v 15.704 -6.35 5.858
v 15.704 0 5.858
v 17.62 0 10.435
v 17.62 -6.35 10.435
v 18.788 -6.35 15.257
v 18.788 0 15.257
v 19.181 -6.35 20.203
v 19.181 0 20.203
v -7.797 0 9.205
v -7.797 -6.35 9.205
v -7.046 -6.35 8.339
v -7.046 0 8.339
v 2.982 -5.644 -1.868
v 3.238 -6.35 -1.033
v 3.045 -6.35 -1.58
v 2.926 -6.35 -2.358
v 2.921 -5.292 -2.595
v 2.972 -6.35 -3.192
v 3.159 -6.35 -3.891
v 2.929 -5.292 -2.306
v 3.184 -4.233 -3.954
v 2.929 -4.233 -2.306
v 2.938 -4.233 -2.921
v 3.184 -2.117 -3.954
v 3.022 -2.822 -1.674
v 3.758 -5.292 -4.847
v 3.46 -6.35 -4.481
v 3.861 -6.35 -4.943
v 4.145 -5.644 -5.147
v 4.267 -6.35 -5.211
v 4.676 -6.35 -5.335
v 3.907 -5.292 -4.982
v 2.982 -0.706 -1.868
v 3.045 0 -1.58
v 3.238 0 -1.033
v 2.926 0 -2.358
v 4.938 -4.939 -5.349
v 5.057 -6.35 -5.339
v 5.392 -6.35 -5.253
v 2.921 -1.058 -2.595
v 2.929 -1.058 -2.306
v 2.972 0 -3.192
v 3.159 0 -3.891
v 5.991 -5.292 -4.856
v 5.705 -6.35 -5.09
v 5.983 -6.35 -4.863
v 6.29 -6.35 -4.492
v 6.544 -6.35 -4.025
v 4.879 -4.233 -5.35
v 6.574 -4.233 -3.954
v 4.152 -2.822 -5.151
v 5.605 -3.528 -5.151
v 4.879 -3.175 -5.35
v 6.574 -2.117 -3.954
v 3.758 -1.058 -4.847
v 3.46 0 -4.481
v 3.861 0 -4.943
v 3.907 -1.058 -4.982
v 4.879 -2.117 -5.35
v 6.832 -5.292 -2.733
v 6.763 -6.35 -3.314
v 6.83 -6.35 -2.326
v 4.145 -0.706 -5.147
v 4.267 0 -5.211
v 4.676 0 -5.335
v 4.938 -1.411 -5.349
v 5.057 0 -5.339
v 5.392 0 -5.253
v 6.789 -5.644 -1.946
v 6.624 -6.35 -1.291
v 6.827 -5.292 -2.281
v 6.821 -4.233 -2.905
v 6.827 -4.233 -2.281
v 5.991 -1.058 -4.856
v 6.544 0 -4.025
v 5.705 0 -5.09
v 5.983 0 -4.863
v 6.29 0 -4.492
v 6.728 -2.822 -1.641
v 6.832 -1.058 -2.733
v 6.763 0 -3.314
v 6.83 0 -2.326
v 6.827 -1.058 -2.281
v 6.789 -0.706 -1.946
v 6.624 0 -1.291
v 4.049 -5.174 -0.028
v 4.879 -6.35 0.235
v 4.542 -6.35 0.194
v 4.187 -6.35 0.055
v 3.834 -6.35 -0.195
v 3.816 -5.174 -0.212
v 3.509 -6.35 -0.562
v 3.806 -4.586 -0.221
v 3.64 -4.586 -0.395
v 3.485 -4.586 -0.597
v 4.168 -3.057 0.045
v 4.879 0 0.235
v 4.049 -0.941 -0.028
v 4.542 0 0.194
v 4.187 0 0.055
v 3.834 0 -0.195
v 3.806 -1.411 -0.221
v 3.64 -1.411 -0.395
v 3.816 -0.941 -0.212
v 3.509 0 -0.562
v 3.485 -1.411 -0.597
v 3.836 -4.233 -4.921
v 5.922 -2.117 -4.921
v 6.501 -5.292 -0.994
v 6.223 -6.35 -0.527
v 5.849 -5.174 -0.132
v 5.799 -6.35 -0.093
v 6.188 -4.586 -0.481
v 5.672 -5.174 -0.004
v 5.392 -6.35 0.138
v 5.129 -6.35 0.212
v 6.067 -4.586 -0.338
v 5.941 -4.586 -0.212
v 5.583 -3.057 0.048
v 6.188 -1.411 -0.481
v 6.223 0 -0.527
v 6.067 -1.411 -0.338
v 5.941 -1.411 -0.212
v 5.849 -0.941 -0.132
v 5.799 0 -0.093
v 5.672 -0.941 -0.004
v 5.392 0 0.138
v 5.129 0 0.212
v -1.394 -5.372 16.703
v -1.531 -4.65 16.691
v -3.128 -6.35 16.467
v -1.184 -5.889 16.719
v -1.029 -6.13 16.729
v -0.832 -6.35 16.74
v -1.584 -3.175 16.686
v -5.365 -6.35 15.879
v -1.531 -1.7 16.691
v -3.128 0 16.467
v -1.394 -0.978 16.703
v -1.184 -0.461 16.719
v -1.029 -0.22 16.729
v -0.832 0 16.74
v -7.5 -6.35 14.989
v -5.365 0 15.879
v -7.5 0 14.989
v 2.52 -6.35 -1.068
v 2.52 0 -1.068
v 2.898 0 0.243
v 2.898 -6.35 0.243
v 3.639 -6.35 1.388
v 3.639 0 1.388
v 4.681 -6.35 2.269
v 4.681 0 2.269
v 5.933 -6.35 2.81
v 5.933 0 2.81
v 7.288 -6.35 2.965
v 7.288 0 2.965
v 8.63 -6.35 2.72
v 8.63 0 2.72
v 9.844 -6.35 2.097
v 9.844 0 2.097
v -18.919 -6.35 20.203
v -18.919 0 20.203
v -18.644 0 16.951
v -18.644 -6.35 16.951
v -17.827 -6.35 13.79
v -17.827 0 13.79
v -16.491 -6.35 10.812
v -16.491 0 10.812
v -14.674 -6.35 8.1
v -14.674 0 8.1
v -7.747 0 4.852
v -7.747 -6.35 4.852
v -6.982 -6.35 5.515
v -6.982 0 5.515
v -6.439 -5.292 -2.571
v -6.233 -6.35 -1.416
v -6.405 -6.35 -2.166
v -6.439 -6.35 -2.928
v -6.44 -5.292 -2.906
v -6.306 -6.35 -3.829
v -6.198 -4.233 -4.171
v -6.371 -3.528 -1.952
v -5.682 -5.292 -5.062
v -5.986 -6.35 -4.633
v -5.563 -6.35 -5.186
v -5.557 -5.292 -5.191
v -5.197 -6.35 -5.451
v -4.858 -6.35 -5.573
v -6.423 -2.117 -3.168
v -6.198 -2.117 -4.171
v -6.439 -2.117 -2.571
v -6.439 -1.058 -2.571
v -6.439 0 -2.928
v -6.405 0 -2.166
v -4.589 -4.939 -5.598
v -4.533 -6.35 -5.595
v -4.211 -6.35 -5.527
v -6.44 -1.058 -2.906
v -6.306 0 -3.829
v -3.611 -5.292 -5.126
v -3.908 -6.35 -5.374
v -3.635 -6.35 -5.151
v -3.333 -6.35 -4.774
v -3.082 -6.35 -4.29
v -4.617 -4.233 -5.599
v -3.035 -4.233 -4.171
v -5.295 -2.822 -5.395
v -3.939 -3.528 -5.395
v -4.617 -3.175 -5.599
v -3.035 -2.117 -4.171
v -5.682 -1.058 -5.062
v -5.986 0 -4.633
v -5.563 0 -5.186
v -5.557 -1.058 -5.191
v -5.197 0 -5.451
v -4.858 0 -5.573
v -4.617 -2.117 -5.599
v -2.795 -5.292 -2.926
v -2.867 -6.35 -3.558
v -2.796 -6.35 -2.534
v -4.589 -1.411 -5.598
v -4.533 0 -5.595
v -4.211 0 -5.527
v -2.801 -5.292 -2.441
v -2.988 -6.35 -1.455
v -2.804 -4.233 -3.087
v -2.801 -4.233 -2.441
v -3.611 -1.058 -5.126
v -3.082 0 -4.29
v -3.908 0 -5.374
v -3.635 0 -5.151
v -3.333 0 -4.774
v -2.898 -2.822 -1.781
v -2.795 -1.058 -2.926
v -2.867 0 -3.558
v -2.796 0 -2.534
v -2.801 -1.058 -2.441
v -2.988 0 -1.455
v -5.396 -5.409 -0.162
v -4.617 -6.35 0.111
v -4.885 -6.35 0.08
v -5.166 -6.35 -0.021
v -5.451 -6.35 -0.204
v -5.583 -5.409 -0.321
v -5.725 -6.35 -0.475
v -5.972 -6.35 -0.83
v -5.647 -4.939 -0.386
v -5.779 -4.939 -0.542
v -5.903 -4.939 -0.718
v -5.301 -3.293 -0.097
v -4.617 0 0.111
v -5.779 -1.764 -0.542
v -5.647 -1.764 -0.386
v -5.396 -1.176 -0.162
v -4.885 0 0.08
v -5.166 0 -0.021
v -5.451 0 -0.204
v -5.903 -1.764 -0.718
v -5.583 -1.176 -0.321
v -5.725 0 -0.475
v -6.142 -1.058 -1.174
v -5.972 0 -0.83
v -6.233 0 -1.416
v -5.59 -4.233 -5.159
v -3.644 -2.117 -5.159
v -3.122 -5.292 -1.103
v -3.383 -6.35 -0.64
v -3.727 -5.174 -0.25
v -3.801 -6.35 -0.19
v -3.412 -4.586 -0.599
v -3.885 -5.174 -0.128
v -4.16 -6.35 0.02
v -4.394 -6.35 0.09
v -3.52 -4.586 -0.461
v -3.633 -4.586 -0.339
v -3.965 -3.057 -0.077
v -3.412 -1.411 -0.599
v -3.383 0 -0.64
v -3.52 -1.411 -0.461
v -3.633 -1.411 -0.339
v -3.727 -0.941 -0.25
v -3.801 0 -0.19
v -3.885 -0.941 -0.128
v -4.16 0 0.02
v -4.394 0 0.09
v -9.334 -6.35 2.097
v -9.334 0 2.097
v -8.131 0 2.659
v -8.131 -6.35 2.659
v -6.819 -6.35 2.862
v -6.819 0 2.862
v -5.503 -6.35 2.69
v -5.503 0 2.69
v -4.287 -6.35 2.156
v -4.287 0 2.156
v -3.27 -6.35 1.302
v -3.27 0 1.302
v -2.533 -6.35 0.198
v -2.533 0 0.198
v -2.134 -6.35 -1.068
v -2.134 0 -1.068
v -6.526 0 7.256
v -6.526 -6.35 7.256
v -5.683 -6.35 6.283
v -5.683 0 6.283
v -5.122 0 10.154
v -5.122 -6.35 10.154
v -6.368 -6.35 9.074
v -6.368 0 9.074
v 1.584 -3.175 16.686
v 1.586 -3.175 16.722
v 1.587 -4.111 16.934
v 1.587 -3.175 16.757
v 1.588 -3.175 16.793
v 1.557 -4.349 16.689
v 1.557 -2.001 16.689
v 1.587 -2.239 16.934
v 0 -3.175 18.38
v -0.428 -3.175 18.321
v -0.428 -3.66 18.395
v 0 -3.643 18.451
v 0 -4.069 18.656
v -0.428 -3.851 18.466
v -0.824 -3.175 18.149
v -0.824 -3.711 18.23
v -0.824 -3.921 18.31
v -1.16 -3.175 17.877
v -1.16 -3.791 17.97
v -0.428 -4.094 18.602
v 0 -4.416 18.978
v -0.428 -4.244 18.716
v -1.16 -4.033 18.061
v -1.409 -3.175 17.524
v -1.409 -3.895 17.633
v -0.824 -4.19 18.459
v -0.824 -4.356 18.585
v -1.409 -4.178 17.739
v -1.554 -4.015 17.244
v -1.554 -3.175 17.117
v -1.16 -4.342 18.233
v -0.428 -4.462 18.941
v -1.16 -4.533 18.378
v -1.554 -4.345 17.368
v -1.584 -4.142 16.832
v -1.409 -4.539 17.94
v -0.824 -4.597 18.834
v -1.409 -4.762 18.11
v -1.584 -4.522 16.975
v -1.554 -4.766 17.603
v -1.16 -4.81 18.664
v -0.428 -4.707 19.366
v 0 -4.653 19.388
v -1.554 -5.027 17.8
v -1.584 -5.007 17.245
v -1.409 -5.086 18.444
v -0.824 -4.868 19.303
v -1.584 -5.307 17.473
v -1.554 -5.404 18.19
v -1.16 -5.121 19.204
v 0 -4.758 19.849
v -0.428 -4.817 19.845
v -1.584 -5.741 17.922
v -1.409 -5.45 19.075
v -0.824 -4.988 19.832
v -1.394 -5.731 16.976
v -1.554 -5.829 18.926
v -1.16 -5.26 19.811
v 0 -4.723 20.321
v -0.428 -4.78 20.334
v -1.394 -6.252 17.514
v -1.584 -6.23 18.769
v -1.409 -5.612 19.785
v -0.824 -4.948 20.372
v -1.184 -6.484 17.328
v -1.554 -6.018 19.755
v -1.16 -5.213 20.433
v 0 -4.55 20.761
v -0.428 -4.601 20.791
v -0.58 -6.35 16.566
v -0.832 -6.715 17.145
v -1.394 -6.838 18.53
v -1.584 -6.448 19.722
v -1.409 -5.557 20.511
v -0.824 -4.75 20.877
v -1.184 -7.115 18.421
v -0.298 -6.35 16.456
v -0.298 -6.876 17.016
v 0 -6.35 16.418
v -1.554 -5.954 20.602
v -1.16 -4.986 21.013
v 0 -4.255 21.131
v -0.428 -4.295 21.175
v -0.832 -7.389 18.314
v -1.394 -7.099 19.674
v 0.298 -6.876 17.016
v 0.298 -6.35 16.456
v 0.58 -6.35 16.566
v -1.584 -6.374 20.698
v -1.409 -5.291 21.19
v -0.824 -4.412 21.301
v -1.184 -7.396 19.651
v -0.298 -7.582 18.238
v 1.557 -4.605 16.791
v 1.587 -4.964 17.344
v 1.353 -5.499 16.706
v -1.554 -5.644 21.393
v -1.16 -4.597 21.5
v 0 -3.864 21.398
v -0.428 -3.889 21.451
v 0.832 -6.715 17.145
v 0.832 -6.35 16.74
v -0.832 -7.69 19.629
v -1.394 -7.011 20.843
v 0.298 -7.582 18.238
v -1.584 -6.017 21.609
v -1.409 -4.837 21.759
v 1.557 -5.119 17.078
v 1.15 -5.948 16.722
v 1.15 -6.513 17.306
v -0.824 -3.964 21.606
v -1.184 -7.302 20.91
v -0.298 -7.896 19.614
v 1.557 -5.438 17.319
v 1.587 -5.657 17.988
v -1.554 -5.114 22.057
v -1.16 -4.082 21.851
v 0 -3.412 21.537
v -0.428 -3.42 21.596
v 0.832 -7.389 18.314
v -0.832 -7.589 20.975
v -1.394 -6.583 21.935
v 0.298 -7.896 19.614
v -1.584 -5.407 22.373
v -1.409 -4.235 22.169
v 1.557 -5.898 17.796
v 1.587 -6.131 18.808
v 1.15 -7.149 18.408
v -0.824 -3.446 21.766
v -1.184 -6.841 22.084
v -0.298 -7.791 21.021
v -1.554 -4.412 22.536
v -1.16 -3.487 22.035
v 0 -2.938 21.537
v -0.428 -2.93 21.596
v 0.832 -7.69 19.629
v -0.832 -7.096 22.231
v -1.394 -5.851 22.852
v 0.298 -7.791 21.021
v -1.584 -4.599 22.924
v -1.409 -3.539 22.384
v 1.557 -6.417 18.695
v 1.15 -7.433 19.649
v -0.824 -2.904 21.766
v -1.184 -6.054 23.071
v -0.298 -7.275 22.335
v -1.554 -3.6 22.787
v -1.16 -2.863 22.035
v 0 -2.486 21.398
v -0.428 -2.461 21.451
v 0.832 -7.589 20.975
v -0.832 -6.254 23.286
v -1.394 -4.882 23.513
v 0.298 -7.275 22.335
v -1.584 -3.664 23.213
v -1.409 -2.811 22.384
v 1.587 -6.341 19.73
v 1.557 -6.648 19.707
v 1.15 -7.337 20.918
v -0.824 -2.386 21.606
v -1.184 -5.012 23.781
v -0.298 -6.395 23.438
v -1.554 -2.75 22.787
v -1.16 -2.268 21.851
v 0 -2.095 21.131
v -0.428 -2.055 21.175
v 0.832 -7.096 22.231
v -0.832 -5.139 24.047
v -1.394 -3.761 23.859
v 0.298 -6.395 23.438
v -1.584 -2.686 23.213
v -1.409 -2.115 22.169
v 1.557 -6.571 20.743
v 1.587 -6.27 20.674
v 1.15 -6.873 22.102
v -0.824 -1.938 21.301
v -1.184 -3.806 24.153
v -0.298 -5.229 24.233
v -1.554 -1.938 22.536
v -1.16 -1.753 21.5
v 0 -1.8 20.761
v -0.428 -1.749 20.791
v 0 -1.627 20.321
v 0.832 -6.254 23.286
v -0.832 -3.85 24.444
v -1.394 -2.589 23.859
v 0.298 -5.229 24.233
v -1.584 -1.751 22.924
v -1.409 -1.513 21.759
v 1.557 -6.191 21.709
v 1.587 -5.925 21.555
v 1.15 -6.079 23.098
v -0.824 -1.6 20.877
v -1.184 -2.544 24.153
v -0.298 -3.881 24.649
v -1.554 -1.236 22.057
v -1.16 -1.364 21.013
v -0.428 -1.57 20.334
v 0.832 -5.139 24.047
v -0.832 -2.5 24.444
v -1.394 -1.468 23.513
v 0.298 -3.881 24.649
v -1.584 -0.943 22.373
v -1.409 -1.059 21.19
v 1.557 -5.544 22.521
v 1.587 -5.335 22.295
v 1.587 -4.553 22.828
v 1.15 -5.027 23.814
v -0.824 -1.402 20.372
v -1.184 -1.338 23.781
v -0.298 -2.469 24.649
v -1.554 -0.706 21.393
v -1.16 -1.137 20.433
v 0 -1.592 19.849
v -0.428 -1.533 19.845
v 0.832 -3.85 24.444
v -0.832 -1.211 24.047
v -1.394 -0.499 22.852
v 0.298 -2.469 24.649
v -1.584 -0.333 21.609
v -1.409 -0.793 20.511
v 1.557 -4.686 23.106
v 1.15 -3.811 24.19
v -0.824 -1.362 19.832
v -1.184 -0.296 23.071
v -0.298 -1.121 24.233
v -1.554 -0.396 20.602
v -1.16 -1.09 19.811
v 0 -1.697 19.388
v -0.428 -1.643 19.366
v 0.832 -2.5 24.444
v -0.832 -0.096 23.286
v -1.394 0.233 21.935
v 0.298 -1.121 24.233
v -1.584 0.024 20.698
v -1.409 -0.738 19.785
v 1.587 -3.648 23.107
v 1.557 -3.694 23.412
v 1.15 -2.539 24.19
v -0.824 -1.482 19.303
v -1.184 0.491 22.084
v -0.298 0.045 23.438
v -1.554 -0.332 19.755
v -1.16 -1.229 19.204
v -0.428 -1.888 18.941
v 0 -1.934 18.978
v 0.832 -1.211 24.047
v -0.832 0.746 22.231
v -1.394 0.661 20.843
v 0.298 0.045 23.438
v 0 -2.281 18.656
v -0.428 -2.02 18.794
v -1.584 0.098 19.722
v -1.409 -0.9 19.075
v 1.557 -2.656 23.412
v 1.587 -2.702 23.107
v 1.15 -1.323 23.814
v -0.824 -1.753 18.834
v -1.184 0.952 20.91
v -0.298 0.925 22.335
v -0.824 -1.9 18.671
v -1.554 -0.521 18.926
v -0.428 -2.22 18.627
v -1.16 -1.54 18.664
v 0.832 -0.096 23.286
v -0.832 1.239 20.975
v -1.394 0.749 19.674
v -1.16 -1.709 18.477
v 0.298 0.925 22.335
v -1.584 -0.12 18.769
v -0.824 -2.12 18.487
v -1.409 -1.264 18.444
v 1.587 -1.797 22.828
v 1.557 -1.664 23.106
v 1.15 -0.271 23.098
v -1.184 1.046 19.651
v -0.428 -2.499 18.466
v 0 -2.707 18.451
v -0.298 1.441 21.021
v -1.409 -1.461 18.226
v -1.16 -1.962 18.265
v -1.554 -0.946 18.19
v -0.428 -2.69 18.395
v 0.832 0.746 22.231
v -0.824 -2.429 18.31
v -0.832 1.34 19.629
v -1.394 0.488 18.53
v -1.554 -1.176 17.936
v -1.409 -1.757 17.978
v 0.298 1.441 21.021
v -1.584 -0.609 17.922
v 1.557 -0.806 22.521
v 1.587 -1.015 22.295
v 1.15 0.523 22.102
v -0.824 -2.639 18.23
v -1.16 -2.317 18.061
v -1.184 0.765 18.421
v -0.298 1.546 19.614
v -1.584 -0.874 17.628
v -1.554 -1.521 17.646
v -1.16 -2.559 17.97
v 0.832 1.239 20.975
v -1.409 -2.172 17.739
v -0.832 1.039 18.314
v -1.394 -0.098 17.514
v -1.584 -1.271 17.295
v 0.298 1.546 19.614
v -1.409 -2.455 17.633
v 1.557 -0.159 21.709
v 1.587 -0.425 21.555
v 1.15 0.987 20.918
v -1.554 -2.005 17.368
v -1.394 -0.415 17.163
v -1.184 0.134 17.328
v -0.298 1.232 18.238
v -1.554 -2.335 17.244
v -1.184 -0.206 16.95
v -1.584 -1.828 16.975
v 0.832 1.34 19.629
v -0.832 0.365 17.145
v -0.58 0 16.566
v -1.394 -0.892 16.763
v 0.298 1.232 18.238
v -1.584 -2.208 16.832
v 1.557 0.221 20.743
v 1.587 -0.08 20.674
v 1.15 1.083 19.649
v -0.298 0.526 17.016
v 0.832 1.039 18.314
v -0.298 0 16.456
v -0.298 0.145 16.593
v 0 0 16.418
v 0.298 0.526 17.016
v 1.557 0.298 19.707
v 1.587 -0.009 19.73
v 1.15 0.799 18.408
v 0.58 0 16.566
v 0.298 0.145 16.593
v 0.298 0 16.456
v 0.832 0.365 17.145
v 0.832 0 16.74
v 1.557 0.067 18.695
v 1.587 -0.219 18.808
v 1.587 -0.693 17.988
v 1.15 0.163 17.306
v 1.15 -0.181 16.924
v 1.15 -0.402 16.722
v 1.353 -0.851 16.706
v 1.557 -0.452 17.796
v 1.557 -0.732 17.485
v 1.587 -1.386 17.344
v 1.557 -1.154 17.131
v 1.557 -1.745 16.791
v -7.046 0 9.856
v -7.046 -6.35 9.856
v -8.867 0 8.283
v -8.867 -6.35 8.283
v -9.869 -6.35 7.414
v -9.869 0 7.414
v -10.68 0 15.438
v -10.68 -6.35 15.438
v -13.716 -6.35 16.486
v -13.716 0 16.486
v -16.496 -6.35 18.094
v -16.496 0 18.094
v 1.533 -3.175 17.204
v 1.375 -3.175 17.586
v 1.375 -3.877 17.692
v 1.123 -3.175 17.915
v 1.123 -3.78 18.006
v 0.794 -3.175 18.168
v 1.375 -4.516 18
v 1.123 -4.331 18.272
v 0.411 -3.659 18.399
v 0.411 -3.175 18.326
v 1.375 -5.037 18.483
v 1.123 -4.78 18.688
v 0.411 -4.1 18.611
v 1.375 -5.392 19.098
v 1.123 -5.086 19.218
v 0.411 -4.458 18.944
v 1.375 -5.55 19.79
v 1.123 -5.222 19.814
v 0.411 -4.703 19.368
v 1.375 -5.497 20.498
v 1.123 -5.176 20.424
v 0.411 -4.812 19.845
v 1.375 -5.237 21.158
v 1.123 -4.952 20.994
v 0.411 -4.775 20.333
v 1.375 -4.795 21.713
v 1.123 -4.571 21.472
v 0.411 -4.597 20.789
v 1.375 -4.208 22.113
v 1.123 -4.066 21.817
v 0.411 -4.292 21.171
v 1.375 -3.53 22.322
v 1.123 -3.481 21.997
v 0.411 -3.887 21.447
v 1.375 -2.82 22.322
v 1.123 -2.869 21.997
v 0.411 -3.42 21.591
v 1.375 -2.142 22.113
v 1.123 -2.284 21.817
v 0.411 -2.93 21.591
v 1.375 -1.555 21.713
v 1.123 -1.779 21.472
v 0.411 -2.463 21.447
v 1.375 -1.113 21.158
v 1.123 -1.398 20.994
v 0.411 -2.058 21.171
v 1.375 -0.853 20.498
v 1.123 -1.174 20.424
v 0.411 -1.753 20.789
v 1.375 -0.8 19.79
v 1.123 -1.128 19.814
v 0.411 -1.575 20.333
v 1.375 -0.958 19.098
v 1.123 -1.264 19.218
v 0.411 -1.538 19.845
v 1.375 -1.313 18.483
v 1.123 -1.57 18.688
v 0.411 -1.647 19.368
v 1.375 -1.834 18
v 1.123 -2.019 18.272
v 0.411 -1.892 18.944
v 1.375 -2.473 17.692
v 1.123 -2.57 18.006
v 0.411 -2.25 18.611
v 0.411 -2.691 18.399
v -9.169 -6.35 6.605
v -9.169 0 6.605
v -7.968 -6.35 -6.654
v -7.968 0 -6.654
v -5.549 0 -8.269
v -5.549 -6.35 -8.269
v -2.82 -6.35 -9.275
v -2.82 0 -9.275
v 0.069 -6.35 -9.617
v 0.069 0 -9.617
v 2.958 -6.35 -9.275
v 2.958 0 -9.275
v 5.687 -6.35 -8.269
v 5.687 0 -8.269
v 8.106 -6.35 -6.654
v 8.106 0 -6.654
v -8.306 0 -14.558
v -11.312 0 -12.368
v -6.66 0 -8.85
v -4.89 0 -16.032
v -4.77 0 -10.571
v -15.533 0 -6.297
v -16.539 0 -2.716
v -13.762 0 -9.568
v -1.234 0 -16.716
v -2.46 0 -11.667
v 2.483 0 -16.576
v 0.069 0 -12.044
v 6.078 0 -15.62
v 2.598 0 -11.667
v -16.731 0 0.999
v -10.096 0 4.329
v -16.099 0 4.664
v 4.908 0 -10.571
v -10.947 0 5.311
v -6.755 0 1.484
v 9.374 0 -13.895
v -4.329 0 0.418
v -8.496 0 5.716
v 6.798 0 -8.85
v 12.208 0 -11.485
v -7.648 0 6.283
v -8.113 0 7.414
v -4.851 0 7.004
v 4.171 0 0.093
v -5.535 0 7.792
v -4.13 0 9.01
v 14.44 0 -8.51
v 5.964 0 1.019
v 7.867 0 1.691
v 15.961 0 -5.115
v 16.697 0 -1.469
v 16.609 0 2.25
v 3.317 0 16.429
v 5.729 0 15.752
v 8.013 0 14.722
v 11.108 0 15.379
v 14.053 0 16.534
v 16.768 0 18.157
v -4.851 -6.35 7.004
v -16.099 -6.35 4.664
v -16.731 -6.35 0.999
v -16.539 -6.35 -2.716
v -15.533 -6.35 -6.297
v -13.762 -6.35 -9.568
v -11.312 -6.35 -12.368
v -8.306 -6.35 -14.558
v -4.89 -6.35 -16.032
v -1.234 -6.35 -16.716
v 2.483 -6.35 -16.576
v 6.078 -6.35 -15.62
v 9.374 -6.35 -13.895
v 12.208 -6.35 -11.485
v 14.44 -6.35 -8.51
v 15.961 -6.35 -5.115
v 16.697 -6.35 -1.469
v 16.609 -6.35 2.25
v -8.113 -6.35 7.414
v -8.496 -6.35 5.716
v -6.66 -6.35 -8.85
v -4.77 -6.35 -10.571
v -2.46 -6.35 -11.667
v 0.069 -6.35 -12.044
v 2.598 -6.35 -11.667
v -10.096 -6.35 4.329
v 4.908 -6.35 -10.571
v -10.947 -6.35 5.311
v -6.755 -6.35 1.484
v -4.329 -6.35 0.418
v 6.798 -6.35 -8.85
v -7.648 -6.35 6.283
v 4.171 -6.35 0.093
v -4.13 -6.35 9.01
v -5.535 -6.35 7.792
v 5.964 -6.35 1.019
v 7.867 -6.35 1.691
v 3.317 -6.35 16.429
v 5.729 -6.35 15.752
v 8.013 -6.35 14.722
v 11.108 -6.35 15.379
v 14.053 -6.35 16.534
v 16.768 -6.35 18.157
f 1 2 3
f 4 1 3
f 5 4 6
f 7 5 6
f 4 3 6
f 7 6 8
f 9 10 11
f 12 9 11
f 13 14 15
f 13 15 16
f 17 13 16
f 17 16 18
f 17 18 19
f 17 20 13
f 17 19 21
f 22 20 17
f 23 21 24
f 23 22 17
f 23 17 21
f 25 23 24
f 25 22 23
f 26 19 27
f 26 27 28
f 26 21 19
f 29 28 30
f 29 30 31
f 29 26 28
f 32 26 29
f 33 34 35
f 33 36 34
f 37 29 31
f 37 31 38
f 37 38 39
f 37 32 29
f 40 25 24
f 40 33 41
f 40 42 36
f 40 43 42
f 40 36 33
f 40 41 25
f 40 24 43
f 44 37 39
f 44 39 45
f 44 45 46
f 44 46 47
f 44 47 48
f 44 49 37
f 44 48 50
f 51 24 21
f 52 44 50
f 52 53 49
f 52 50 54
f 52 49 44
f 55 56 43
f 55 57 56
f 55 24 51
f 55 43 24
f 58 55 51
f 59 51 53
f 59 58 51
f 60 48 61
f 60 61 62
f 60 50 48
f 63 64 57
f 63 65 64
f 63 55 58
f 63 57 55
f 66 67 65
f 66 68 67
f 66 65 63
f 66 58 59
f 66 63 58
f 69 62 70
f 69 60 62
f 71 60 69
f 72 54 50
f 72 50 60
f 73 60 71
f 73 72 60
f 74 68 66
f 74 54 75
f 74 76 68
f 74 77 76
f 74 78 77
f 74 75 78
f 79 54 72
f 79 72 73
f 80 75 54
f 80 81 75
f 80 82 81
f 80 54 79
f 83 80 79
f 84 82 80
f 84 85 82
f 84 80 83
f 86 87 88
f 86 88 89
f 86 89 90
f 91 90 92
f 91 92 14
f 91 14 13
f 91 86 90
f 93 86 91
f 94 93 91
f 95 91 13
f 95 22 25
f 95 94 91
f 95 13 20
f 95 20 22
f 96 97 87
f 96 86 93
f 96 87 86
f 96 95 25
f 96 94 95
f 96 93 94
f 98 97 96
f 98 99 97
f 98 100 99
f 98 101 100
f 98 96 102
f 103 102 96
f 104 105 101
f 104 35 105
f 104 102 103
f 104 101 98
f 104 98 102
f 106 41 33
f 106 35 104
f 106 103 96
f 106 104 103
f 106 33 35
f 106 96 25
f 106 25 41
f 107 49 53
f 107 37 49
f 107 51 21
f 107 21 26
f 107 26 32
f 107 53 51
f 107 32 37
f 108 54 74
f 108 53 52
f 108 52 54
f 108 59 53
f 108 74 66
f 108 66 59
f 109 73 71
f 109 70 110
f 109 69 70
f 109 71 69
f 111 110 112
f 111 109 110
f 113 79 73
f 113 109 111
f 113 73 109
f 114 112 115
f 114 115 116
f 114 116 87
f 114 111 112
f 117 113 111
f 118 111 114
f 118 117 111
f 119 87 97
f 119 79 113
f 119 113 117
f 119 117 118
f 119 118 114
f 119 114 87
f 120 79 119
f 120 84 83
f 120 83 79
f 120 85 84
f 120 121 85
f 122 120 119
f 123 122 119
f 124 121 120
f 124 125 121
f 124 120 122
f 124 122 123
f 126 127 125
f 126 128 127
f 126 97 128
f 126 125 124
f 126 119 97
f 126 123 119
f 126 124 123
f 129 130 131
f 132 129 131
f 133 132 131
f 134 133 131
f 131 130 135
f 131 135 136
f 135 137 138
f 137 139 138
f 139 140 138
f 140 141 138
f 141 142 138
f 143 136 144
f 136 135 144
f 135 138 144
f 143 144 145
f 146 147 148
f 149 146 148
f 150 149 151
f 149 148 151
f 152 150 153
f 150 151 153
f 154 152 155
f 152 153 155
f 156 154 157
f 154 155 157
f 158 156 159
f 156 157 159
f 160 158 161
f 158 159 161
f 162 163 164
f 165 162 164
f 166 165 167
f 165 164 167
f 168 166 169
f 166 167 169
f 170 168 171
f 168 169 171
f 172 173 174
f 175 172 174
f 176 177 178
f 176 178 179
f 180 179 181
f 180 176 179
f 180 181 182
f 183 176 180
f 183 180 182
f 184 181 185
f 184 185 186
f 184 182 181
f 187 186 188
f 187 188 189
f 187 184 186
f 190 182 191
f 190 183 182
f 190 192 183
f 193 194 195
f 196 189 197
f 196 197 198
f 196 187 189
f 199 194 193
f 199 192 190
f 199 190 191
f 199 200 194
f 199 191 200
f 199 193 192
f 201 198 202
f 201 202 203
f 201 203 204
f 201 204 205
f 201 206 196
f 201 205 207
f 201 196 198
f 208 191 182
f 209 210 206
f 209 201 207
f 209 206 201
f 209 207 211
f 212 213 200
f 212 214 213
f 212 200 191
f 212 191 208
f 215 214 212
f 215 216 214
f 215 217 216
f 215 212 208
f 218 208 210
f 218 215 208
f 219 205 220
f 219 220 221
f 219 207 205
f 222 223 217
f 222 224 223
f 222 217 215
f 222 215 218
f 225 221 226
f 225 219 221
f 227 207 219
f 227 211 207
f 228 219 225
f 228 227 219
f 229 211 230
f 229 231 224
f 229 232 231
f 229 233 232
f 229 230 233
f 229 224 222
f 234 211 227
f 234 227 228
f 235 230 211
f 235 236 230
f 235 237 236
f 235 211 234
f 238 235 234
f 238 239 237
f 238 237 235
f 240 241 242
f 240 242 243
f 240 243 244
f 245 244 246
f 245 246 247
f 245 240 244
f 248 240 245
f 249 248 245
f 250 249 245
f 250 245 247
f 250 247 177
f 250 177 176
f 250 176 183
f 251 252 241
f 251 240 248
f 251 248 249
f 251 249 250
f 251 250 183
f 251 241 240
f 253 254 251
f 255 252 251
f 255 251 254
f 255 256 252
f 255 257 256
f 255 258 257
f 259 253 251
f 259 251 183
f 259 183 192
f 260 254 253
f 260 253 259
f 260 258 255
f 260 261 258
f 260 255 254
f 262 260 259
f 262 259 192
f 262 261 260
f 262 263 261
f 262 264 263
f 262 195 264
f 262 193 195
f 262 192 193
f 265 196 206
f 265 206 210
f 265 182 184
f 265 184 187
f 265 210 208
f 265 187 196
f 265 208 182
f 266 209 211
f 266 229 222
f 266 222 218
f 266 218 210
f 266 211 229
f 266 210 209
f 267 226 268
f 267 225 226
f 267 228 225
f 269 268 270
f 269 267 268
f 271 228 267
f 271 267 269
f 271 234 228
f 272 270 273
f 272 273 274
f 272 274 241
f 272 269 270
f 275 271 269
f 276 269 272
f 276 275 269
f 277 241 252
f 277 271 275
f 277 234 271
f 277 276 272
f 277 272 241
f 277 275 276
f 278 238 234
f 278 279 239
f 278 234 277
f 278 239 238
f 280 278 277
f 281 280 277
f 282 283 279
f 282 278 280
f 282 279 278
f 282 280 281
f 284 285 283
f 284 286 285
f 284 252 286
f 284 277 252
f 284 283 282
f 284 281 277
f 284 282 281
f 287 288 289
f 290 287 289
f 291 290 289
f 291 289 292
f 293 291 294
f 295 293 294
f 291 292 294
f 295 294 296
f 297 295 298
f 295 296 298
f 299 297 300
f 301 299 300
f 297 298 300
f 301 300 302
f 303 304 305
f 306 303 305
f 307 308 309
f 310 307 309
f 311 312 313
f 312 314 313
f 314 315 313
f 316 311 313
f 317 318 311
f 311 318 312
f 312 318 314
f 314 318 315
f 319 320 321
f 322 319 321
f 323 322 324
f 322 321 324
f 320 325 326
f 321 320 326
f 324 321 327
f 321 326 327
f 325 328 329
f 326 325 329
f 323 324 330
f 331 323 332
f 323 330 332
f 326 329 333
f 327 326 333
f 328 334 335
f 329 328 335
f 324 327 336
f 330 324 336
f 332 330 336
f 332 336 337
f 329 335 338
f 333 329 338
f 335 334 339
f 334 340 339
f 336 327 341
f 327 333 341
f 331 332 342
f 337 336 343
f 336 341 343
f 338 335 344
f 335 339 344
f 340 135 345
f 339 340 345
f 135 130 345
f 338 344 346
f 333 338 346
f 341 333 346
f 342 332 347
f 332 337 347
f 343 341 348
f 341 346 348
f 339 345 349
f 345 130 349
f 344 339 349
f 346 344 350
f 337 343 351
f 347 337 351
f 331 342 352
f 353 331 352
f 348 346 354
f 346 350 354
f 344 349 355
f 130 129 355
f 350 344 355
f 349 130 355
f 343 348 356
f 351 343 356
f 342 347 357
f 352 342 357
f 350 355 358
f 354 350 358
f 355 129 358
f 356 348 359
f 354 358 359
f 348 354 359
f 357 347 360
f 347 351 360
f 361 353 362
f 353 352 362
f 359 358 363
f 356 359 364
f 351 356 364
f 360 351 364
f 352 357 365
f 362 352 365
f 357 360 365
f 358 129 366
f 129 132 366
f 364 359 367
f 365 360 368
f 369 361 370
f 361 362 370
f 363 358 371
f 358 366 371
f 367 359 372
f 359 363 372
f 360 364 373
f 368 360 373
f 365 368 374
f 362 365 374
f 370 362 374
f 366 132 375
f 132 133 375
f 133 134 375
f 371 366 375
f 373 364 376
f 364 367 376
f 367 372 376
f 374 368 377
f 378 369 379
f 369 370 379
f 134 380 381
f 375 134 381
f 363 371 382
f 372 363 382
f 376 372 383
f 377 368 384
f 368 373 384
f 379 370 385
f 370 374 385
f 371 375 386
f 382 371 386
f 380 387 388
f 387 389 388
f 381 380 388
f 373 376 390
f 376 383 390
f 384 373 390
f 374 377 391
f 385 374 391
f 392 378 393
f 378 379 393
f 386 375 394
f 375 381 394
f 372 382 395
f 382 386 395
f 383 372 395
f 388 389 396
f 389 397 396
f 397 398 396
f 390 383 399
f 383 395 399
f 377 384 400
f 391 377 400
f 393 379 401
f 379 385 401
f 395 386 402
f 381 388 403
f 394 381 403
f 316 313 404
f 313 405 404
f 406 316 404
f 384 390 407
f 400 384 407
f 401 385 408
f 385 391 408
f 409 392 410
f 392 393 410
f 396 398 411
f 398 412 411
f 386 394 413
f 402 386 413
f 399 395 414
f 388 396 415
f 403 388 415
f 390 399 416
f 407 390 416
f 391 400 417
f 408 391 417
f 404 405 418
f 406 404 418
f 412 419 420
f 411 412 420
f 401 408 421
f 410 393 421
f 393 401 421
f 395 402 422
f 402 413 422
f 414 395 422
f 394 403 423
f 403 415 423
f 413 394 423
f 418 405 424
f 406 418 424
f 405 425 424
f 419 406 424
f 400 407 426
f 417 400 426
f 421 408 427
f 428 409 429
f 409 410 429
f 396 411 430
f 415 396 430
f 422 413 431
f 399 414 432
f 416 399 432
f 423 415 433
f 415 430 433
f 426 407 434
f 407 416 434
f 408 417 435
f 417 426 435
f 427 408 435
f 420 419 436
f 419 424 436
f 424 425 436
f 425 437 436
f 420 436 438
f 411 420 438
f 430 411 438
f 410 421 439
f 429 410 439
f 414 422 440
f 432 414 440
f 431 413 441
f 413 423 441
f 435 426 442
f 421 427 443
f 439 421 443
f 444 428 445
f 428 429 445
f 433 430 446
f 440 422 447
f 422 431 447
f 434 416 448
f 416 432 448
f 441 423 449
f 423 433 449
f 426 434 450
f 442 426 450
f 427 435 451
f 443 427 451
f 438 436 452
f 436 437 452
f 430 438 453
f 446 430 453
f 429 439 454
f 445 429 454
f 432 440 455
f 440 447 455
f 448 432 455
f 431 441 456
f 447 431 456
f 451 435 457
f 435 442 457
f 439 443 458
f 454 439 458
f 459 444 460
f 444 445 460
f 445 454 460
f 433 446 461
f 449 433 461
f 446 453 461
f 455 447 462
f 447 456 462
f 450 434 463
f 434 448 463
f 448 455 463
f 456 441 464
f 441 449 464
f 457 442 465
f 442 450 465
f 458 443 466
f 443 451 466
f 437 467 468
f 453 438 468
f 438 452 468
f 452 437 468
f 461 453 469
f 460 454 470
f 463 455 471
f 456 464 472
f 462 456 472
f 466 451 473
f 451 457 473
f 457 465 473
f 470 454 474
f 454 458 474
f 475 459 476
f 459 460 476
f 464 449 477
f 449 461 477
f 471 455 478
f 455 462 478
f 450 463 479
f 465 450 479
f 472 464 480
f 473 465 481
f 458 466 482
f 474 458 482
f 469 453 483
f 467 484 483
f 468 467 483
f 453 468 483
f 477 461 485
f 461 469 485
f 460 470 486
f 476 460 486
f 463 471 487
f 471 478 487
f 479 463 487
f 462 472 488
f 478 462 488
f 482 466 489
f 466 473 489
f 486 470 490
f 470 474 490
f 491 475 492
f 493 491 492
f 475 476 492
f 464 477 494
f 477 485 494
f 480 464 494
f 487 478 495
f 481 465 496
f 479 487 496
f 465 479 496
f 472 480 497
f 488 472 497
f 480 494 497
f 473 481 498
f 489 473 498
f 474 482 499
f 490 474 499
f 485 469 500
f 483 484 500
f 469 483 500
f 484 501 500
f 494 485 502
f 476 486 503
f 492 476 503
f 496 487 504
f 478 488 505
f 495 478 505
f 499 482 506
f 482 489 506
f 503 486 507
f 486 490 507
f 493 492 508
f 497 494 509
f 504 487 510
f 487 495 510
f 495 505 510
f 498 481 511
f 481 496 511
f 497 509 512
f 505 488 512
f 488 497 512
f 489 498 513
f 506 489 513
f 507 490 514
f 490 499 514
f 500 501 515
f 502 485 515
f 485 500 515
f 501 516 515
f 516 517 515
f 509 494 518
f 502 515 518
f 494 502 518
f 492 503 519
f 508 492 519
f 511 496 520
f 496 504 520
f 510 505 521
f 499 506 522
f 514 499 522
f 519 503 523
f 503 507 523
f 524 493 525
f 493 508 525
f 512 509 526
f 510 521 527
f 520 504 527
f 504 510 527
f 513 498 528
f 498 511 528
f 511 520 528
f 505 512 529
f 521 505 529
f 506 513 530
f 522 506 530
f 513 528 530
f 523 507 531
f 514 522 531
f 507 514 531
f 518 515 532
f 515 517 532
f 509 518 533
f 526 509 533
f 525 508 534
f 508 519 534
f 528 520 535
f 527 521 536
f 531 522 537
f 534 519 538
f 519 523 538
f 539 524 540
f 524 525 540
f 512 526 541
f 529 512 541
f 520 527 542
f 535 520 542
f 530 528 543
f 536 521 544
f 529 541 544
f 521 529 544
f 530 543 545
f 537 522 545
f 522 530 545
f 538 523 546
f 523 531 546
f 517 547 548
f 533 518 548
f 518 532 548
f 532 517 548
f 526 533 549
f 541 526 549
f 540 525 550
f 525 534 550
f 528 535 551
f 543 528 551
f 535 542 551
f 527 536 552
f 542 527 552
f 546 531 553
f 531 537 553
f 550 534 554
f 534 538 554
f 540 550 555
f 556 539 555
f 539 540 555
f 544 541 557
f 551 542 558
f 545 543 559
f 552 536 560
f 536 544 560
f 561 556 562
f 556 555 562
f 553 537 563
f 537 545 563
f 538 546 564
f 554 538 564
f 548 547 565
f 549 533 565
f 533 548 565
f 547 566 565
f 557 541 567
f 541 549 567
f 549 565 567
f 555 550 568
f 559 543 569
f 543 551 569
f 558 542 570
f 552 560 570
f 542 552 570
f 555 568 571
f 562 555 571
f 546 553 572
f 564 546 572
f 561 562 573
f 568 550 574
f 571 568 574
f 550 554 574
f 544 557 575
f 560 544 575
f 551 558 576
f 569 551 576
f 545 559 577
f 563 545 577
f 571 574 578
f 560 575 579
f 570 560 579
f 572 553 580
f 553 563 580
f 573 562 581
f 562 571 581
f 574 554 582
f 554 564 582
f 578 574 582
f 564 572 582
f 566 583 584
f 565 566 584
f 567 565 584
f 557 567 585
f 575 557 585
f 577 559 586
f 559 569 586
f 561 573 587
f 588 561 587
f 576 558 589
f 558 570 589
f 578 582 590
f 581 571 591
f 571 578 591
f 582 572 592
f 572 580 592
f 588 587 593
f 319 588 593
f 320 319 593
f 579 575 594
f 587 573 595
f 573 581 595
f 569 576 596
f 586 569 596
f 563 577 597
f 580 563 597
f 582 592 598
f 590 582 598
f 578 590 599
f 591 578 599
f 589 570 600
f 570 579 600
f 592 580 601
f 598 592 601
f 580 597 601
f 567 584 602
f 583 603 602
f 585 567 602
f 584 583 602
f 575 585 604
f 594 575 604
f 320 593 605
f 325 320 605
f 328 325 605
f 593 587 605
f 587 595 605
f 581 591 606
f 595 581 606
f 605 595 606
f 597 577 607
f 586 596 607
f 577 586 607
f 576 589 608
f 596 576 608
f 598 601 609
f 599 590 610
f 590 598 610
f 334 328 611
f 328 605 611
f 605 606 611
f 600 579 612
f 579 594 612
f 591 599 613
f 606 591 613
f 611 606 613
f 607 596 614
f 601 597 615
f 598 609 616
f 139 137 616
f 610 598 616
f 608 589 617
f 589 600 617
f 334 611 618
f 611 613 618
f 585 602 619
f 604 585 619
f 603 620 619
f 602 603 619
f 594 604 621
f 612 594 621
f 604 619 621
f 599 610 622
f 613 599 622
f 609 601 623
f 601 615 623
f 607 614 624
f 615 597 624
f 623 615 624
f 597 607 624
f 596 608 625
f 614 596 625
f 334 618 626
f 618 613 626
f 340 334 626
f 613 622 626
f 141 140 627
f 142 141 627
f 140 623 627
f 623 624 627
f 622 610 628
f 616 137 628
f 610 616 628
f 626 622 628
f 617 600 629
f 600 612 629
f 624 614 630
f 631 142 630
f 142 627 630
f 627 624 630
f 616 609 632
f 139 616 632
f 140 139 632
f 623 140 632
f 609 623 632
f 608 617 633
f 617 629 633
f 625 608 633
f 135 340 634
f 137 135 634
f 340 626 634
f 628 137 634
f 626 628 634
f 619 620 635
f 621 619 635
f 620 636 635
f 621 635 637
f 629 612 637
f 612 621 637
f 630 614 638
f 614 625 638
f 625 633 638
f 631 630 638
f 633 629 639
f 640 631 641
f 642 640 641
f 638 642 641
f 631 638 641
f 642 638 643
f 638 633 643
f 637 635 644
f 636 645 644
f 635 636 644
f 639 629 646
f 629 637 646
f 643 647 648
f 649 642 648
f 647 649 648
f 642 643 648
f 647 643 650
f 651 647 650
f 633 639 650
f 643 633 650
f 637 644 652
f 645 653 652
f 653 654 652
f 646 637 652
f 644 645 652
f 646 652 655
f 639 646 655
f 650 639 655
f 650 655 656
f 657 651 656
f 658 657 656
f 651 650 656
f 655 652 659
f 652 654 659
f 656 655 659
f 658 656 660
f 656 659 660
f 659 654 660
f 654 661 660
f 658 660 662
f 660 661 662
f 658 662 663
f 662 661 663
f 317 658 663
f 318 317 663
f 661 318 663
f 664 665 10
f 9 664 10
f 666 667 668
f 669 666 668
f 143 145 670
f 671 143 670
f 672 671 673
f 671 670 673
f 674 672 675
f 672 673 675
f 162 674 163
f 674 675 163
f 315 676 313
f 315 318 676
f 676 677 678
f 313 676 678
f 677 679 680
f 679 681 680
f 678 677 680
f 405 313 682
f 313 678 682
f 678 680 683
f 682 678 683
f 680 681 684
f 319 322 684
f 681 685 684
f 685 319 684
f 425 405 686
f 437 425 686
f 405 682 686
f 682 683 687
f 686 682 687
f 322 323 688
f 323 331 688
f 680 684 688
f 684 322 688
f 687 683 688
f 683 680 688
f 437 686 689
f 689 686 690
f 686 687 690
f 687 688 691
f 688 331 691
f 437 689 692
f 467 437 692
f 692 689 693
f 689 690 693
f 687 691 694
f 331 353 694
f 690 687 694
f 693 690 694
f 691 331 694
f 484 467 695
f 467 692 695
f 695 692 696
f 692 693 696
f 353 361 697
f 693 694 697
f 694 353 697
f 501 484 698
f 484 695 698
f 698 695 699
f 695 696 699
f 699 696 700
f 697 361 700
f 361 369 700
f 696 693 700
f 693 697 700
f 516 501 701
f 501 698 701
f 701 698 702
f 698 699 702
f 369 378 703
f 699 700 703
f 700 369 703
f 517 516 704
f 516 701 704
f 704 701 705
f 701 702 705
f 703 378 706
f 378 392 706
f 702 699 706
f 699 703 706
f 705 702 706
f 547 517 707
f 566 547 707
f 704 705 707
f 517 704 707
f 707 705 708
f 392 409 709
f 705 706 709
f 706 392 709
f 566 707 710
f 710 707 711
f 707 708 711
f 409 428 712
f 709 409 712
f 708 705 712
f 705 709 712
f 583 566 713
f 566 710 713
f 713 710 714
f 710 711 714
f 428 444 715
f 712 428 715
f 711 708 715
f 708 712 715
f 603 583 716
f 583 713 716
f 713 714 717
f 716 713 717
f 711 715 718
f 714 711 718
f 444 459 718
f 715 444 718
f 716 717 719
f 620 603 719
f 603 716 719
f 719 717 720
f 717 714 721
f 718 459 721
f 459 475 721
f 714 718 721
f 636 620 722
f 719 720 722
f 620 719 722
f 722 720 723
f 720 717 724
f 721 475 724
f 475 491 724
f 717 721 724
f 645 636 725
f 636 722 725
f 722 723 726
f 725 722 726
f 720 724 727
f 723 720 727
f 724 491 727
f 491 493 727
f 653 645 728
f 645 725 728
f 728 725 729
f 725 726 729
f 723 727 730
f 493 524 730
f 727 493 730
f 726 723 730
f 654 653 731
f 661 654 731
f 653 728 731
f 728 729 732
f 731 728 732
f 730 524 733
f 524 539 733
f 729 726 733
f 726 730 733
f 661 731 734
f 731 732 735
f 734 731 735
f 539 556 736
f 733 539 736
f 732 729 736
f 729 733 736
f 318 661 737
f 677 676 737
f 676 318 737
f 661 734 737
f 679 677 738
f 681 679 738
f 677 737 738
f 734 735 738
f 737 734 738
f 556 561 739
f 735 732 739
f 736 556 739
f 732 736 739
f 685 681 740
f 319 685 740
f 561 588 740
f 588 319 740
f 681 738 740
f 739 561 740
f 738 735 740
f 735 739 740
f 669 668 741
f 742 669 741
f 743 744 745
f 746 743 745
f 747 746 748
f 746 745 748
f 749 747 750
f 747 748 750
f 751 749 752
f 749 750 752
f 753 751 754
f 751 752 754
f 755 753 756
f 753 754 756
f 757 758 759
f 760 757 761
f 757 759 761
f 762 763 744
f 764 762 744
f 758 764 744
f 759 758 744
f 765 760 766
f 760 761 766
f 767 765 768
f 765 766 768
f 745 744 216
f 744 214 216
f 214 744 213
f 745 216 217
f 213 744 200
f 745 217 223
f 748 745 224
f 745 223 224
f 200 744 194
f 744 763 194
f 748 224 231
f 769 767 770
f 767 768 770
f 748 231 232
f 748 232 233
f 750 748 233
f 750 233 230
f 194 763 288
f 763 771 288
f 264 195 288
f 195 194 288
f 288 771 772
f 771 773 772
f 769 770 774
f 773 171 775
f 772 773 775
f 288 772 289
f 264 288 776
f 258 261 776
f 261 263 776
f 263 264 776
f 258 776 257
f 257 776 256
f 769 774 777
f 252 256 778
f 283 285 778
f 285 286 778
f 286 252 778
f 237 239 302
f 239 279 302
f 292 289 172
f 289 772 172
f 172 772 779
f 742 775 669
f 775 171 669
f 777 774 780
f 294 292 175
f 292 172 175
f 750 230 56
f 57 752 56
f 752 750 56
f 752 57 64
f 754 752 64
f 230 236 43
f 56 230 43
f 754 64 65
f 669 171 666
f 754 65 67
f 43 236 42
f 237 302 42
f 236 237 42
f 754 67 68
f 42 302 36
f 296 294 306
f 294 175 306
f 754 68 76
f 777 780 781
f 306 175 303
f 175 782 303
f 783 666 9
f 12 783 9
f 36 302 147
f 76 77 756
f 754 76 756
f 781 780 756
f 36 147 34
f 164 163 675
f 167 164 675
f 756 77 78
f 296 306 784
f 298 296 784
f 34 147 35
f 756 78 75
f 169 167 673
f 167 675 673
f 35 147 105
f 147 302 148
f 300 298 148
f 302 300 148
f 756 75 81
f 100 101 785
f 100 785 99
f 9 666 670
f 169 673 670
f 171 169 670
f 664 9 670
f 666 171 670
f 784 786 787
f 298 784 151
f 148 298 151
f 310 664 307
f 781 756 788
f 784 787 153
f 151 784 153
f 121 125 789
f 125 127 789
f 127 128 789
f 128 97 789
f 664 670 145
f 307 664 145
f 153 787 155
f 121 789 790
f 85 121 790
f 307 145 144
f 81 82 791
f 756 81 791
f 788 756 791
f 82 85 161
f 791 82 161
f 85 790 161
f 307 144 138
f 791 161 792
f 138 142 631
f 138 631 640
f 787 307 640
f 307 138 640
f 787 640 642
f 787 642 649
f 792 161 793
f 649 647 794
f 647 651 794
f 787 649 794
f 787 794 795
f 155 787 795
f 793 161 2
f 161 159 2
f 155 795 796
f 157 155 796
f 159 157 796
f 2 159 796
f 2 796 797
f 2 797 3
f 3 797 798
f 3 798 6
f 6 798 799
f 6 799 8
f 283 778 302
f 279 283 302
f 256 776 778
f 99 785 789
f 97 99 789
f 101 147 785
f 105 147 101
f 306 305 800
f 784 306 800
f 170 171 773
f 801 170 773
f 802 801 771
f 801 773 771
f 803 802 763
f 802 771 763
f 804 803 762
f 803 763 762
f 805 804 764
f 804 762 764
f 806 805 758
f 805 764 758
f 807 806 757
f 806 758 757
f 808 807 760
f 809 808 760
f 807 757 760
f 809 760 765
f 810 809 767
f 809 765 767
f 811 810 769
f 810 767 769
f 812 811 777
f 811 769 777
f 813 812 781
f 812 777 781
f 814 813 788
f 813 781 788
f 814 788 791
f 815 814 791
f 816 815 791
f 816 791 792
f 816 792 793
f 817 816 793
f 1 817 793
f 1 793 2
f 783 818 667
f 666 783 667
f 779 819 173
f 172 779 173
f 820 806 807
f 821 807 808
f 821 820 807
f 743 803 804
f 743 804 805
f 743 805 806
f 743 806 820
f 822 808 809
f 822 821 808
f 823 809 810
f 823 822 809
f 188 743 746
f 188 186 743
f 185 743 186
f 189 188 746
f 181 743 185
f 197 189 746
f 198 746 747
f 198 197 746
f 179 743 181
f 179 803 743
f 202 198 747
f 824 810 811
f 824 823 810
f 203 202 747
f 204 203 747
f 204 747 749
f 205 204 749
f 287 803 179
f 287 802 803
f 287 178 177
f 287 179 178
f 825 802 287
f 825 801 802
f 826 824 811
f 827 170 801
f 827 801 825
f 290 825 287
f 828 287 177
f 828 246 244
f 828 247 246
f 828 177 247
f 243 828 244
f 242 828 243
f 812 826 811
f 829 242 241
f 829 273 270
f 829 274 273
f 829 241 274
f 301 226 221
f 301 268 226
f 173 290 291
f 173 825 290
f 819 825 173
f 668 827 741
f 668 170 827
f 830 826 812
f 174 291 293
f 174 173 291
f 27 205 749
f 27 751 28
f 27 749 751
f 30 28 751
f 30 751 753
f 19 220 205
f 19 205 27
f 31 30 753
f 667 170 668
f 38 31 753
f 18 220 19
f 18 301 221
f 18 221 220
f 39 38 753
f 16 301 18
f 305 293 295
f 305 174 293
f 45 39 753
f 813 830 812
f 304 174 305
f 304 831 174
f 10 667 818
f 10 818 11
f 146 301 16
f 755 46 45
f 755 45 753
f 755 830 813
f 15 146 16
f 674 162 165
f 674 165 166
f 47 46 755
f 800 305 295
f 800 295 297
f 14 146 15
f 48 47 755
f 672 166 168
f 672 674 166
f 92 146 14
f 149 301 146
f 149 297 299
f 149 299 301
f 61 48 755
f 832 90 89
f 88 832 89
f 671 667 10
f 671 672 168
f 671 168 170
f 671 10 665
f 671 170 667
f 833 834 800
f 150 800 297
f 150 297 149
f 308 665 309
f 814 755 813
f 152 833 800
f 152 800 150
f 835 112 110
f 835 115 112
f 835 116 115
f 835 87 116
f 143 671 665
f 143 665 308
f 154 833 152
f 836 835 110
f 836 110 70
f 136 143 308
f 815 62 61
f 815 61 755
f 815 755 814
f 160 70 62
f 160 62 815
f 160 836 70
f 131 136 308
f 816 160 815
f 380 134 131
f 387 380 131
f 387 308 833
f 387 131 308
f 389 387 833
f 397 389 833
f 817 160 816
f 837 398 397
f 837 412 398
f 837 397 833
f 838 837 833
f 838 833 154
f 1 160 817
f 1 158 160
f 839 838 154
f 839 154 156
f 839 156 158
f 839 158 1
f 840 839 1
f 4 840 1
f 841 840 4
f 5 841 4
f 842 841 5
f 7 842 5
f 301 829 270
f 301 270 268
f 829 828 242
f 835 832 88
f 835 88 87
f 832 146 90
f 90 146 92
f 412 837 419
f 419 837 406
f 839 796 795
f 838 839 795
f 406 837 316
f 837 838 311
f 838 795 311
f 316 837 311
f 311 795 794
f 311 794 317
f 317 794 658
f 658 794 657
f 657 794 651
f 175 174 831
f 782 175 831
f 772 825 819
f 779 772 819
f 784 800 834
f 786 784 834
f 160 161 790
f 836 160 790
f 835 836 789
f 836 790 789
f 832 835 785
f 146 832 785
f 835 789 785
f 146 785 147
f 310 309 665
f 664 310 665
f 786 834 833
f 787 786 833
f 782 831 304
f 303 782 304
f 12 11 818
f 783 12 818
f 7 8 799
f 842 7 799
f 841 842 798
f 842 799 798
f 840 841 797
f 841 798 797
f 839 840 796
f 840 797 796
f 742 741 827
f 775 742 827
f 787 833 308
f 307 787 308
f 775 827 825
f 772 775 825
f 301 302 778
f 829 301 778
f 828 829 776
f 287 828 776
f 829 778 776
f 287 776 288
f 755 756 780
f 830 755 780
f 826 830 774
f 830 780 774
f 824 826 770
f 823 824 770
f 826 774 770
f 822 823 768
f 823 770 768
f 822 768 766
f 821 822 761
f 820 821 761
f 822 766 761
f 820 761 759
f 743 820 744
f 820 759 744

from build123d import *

# Parameters (mm, degrees)
F1_DEPTH = 6.35
F3_DEPTH = 6.35


with BuildPart() as f1:
    # F0 (on Front) → F1 (new body)
    with BuildSketch(Plane.XZ):
        with BuildLine():
            ThreePointArc((19.181395, 20.203114), (14.052681, 16.534086), (8.012758, 14.721684))
            ThreePointArc((8.012758, 14.721684), (0.289171, 16.758539), (-7.500089, 14.989361))
            ThreePointArc((-7.500089, 14.989361), (-13.716297, 16.485978), (-18.918605, 20.203114))
            ThreePointArc((-18.918605, 20.203114), (-17.826595, 13.790316), (-14.673657, 8.100373))
            ThreePointArc((-14.673657, 8.100373), (-1.233876, -16.715556), (15.70401, 5.858015))
            ThreePointArc((15.70401, 5.858015), (18.299639, 12.822835), (19.181395, 20.203114))
        make_face()
        with BuildLine():
            ThreePointArc((8.10602, -6.653593), (0.068926, -12.043612), (-7.968167, -6.653593))
            ThreePointArc((-7.968167, -6.653593), (0.068926, -9.617061), (8.10602, -6.653593))
        make_face(mode=Mode.SUBTRACT)
        with BuildLine():
            ThreePointArc((-9.333542, 2.097219), (-4.876024, 2.465913), (-2.134293, -1.067968))
            ThreePointArc((-2.134293, -1.067968), (-5.517987, 1.005761), (-9.333542, 2.097219))
        make_face(mode=Mode.SUBTRACT)
        with BuildLine():
            add(Edge.make_bspline(
                [(-4.616792, 0.11122), (-7.779488, 0.11122), (-6.19814, -4.171093), (-4.616792, -8.453405), (-3.035445, -4.171093), (-1.454097, 0.11122), (-4.616792, 0.11122)],
                knots=[0, 0, 0, 2.094395, 2.094395, 4.18879, 4.18879, 6.283185, 6.283185, 6.283185], degree=2, weights=[1, 0.5, 1, 0.5, 1, 0.5, 1]))
        make_face(mode=Mode.SUBTRACT)
        with BuildLine():
            add(Edge.make_bspline(
                [(4.87877, 0.235344), (1.488251, 0.235344), (3.183511, -3.953874), (4.87877, -8.143093), (6.57403, -3.953874), (8.269289, 0.235344), (4.87877, 0.235344)],
                knots=[0, 0, 0, 2.094395, 2.094395, 4.18879, 4.18879, 6.283185, 6.283185, 6.283185], degree=2, weights=[1, 0.5, 1, 0.5, 1, 0.5, 1]))
        make_face(mode=Mode.SUBTRACT)
        with BuildLine():
            ThreePointArc((2.520395, -1.067968), (5.286956, 2.585701), (9.84377, 2.097219))
            ThreePointArc((9.84377, 2.097219), (5.964175, 1.018804), (2.520395, -1.067968))
        make_face(mode=Mode.SUBTRACT)
    extrude(amount=F1_DEPTH)

    # F2 (on face) → F3 (cut)
    with BuildSketch(Plane.XZ.offset(6.35)):
        Polygon((-9.16881, 6.605397), (-10.947034, 5.310706), (-10.096497, 4.329317), (-8.496134, 5.716297), (-7.747058, 4.851977), (-6.98237, 5.514705), (-7.648337, 6.283129), (-6.526215, 7.255634), (-5.683378, 6.283129), (-4.851439, 7.004143), (-5.534531, 7.792326), (-4.129699, 9.009846), (-5.121633, 10.154386), (-6.368298, 9.073945), (-7.046136, 9.856067), (-7.797124, 9.205212), (-7.046136, 8.338687), (-8.11346, 7.413674), (-8.866605, 8.282689), (-9.869316, 7.413674), align=None)
    extrude(amount=-F3_DEPTH, mode=Mode.SUBTRACT)

    # F5 (on offset) → F6 (revolve)
    with BuildSketch(Plane.XZ.offset(3.175)):
        with BuildLine():
            ThreePointArc((0, 18.380211), (-1.122532, 15.670179), (1.5875, 16.792711))
            ThreePointArc((1.5875, 16.792711), (1.122532, 17.915243), (0, 18.380211))
        make_face()
    revolve(axis=Axis((-7.444045, -3.175, 19.967711), (-1, 0, 0)))


solid = f1.part
